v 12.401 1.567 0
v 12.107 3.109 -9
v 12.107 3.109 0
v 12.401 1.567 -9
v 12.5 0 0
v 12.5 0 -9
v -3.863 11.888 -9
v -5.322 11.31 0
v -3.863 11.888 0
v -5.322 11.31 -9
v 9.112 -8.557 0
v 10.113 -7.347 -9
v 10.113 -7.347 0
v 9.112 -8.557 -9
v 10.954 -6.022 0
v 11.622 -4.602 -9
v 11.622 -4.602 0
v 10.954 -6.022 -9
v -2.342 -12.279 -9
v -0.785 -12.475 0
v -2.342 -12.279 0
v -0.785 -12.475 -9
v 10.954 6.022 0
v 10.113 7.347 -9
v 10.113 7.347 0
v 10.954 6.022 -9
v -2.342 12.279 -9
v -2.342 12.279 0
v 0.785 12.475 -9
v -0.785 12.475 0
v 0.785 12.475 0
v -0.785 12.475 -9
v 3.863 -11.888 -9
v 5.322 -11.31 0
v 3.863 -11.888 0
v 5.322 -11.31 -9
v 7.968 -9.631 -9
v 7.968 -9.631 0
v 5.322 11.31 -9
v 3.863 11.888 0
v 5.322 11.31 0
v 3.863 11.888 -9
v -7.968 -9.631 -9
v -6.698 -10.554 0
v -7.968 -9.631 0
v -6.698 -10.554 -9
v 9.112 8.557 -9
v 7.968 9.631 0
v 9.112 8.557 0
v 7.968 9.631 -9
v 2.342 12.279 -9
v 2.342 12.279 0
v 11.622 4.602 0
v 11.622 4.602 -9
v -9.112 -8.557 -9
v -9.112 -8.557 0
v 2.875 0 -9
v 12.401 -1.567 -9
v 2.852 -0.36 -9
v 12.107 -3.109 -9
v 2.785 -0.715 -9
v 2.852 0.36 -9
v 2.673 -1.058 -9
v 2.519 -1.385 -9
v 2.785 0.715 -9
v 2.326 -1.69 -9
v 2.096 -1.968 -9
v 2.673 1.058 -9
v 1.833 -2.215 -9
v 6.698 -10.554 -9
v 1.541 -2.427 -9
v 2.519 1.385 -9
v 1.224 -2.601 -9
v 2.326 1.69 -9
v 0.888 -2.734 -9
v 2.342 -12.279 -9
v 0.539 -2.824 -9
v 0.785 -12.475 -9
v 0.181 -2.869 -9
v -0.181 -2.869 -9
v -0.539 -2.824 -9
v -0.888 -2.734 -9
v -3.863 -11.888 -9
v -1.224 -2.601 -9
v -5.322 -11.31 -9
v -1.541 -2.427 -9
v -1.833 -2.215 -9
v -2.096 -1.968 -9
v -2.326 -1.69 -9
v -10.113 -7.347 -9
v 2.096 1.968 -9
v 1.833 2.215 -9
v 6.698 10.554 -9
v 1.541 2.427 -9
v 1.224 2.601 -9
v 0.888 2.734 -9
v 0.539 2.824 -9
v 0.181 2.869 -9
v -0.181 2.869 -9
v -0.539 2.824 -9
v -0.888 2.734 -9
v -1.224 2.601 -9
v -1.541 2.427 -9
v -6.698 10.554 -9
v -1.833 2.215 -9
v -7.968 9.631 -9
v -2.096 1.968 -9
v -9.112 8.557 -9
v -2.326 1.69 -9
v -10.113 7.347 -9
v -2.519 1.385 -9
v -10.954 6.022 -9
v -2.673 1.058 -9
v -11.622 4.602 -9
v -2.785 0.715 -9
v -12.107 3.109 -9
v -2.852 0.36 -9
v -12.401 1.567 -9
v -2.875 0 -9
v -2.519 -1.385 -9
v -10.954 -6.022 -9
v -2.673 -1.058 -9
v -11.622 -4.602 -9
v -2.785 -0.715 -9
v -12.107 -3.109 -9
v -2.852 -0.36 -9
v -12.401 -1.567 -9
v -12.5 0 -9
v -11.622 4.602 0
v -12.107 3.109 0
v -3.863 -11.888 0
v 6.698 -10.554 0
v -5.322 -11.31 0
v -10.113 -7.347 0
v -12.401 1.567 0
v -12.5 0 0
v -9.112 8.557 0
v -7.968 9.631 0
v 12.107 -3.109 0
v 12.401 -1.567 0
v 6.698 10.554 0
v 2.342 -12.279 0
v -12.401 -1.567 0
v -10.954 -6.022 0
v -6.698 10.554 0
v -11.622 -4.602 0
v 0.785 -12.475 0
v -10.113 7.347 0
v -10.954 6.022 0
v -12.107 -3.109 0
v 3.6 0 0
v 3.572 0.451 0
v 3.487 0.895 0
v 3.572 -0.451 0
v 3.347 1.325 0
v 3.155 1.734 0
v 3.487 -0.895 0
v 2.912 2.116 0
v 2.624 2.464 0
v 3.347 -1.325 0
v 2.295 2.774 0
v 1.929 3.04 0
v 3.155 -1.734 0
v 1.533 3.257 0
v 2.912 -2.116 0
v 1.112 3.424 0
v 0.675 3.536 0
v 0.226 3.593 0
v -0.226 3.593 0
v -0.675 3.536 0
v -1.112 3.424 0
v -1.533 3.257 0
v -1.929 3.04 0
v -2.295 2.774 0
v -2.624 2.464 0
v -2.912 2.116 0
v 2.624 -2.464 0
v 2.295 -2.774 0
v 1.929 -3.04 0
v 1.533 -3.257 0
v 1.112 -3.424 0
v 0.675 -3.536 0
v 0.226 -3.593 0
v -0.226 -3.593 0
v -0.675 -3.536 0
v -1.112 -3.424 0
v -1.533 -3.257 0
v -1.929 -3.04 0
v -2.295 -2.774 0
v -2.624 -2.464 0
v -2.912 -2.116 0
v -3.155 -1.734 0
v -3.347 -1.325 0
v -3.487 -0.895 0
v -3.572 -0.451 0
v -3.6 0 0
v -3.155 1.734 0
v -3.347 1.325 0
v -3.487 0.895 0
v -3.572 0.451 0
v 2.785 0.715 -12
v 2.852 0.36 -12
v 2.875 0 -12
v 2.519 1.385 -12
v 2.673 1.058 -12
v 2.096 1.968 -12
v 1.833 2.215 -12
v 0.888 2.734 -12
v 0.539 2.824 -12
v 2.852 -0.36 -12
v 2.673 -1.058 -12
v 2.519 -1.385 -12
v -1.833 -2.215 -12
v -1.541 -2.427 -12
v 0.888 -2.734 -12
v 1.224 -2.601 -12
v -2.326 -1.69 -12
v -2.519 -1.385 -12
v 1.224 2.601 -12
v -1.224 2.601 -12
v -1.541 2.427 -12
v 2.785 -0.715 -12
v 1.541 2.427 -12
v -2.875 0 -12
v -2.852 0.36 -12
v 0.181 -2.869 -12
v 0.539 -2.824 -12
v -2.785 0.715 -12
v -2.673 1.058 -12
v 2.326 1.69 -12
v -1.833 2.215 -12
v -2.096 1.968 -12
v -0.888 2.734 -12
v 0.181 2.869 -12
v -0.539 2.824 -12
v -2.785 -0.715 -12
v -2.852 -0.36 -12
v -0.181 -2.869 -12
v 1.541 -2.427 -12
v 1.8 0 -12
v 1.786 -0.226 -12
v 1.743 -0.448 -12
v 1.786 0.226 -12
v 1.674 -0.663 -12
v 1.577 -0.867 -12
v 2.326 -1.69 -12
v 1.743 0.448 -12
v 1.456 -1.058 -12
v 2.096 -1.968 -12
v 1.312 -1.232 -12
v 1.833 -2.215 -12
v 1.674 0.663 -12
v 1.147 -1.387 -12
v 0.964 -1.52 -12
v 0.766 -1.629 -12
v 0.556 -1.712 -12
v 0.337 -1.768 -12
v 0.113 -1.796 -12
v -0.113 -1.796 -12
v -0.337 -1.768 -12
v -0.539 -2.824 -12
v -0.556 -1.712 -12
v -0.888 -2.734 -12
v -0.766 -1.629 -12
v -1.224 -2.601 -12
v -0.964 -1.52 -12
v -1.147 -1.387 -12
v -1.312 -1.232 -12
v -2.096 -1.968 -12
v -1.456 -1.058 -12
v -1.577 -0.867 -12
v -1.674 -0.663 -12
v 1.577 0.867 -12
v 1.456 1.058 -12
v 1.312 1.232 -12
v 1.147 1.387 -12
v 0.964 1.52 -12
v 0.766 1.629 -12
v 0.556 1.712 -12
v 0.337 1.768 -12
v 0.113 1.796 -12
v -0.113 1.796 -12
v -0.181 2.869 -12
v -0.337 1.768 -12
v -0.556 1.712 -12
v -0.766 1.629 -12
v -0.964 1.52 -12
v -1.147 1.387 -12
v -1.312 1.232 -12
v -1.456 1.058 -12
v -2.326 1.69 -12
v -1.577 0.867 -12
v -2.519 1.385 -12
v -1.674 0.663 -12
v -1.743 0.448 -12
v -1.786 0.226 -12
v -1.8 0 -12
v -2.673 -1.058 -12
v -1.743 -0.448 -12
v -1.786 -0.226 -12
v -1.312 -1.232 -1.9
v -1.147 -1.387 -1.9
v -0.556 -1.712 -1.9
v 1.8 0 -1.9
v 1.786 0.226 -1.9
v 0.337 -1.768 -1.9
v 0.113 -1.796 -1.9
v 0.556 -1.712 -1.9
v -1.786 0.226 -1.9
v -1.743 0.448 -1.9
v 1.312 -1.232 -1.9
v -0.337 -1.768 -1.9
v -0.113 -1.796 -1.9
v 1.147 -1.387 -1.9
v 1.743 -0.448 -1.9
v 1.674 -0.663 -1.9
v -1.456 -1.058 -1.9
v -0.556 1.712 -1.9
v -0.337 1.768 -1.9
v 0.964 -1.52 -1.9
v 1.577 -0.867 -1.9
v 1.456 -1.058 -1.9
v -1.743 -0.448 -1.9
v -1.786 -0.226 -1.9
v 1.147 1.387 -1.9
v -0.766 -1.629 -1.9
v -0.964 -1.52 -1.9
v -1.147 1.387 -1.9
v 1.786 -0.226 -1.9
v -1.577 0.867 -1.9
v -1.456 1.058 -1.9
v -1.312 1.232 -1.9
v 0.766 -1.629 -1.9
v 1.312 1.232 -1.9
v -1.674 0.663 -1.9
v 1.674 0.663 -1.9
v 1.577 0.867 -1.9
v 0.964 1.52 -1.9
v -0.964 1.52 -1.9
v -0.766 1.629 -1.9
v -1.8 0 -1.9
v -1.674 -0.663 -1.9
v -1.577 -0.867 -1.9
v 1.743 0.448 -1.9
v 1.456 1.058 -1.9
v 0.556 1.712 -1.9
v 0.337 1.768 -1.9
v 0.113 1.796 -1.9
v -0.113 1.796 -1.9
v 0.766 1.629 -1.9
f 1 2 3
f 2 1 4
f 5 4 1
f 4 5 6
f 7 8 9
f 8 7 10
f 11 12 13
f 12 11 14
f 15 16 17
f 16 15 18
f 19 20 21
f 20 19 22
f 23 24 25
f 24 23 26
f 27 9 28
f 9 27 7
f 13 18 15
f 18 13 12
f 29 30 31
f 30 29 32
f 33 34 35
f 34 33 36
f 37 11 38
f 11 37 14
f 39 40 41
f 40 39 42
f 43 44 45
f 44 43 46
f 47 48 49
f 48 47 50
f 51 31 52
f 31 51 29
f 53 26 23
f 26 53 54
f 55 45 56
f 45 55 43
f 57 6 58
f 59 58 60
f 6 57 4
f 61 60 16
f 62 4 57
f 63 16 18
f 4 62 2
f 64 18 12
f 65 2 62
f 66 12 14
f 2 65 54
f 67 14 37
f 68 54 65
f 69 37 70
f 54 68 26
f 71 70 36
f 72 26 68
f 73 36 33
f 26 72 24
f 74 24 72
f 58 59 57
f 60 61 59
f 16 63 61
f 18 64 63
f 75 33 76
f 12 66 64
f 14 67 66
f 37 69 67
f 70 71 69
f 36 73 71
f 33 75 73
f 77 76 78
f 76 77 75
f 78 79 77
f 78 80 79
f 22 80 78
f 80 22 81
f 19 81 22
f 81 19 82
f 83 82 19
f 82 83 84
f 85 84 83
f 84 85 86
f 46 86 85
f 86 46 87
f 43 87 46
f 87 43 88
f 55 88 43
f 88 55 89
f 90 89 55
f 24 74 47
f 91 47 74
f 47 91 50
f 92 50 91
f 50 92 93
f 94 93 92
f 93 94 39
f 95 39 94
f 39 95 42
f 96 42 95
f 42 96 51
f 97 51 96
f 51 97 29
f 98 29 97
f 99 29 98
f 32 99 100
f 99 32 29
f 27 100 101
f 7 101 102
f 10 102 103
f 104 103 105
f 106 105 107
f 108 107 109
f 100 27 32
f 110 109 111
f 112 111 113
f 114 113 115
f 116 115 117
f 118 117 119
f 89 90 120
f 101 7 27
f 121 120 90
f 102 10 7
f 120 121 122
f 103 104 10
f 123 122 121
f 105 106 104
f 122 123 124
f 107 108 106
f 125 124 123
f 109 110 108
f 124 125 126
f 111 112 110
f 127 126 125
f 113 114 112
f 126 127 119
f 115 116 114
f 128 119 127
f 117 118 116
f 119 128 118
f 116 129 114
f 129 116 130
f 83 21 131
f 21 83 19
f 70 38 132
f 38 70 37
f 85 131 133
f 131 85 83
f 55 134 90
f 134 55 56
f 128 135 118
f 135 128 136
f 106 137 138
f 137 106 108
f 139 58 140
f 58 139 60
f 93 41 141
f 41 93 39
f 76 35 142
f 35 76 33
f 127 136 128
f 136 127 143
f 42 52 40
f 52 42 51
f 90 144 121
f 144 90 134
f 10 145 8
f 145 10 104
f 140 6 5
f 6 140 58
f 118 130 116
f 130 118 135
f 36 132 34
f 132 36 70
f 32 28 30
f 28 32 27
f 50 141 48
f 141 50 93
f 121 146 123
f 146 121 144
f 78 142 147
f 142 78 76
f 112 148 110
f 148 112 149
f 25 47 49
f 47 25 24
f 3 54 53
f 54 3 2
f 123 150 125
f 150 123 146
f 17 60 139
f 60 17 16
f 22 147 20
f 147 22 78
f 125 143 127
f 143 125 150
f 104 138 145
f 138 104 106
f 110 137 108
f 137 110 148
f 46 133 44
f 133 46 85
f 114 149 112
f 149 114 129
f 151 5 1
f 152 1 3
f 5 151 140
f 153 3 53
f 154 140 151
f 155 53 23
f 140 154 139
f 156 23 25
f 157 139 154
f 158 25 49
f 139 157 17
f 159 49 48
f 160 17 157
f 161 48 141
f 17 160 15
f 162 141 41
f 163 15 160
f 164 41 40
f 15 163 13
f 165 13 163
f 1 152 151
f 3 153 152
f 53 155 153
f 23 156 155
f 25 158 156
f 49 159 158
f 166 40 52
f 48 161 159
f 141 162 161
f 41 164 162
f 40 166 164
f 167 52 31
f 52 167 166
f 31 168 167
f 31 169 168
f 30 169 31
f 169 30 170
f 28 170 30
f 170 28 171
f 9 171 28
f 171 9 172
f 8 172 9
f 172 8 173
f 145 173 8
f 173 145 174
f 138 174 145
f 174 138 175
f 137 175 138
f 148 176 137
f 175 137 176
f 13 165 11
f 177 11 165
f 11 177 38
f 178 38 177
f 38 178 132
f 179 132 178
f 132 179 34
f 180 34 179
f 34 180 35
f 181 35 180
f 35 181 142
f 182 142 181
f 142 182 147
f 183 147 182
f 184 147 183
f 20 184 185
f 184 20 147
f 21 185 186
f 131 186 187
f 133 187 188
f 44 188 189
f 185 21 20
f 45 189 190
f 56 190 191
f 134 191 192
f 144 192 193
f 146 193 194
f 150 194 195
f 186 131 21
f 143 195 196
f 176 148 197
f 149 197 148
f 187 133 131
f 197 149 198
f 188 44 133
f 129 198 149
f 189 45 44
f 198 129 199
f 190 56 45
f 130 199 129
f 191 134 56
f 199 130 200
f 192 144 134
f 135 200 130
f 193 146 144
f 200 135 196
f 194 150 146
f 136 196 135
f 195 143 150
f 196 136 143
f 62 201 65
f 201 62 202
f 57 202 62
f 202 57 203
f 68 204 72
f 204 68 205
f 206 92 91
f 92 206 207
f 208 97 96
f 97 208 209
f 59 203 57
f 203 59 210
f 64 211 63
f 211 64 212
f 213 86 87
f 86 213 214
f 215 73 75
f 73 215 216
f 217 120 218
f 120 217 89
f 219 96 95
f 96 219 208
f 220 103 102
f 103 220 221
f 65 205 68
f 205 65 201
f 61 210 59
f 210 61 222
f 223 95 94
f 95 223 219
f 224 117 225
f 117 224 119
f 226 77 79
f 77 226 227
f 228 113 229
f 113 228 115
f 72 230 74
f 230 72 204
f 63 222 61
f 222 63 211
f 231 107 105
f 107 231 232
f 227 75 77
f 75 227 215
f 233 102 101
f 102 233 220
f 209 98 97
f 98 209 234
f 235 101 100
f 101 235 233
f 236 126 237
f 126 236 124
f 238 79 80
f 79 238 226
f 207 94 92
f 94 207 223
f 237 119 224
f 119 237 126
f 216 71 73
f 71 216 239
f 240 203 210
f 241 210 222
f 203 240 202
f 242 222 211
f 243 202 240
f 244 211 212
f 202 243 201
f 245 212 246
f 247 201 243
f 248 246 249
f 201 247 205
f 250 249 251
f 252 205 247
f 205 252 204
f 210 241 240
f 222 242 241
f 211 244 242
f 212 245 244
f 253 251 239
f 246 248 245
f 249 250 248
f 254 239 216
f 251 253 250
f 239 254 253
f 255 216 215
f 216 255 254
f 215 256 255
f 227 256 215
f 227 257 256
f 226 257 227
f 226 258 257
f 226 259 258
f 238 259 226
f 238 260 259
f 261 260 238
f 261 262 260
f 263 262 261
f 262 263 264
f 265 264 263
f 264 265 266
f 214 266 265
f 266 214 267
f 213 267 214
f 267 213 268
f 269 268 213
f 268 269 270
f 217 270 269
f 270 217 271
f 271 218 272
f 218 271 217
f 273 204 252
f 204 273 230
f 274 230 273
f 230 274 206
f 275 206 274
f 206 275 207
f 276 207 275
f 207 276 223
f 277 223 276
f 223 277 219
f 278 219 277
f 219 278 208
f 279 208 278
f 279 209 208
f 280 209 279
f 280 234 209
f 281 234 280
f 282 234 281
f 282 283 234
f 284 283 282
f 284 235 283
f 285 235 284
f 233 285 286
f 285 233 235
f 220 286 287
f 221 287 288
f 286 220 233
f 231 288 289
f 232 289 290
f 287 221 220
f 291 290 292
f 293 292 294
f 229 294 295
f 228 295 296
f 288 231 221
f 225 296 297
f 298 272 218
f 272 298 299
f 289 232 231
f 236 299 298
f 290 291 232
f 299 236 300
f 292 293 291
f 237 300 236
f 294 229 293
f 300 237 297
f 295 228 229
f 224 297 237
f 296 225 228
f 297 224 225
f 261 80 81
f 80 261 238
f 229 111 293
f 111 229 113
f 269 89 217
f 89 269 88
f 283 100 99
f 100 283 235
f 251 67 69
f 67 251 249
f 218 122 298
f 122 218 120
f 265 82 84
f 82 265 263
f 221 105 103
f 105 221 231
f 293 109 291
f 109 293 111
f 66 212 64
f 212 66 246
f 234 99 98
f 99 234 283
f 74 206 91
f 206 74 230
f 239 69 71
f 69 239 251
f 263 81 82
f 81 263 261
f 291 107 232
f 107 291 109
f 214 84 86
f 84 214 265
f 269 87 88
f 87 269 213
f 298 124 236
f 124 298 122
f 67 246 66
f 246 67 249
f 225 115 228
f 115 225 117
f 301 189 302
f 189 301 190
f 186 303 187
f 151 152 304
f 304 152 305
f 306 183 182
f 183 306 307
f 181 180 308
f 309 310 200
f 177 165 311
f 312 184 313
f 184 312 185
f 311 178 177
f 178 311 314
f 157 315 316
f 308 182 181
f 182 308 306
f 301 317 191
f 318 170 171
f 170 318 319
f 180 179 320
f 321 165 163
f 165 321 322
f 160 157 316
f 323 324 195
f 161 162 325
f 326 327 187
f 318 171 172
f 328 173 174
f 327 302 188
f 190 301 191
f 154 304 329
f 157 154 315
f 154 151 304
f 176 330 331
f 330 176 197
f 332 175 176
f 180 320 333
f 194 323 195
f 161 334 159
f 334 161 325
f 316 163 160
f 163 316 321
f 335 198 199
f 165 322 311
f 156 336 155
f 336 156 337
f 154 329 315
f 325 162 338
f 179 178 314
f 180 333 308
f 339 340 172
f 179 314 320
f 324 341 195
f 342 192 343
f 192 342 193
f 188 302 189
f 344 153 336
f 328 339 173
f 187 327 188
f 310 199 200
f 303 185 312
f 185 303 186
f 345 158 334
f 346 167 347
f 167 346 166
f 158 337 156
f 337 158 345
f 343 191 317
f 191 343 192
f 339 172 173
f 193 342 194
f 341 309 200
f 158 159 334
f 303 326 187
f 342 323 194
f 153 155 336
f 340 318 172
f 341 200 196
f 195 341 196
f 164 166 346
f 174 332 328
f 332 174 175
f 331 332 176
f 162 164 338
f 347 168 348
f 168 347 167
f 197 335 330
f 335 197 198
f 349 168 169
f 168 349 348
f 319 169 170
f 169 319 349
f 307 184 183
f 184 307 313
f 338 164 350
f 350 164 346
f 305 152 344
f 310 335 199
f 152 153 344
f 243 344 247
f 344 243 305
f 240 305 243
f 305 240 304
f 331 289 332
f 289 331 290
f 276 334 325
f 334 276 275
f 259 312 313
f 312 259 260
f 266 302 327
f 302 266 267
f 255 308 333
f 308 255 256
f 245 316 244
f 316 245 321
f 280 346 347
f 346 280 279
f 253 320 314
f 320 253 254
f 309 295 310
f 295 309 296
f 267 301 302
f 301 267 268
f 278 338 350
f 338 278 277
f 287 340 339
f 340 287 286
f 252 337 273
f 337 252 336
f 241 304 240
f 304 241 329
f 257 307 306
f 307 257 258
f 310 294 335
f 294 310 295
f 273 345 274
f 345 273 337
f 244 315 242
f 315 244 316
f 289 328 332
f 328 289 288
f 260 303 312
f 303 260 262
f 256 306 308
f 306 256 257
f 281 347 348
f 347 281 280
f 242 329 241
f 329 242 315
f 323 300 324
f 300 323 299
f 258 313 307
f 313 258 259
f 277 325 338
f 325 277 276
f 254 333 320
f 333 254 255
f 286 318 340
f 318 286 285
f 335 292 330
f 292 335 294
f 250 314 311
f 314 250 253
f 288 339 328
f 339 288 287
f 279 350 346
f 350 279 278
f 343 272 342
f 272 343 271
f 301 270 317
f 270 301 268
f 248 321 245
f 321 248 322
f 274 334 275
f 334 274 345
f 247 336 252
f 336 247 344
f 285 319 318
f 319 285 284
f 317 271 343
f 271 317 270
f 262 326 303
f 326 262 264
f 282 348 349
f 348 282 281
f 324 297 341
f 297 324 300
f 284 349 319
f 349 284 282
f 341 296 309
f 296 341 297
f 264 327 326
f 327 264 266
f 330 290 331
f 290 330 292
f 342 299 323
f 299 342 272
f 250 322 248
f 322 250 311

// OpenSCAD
$fn = 50;


difference() {
	union() {
		translate(v = [0, 0, -9.0000000000]) {
			cylinder(h = 9, r = 12.5000000000);
		}
		#translate(v = [0, 0, -12.0000000000]) {
			cylinder(h = 12, r = 2.8750000000);
		}
	}
	union() {
		translate(v = [0, 0, 0]) {
			rotate(a = [0, 0, 0]) {
				difference() {
					union() {
						translate(v = [0, 0, -12.0000000000]) {
							cylinder(h = 12, r = 1.5000000000);
						}
						translate(v = [0, 0, -1.9000000000]) {
							cylinder(h = 1.9000000000, r1 = 1.8000000000, r2 = 3.6000000000);
						}
						translate(v = [0, 0, -12.0000000000]) {
							cylinder(h = 12, r = 1.8000000000);
						}
						translate(v = [0, 0, -12.0000000000]) {
							cylinder(h = 12, r = 1.5000000000);
						}
					}
					union();
				}
			}
		}
	}
}
